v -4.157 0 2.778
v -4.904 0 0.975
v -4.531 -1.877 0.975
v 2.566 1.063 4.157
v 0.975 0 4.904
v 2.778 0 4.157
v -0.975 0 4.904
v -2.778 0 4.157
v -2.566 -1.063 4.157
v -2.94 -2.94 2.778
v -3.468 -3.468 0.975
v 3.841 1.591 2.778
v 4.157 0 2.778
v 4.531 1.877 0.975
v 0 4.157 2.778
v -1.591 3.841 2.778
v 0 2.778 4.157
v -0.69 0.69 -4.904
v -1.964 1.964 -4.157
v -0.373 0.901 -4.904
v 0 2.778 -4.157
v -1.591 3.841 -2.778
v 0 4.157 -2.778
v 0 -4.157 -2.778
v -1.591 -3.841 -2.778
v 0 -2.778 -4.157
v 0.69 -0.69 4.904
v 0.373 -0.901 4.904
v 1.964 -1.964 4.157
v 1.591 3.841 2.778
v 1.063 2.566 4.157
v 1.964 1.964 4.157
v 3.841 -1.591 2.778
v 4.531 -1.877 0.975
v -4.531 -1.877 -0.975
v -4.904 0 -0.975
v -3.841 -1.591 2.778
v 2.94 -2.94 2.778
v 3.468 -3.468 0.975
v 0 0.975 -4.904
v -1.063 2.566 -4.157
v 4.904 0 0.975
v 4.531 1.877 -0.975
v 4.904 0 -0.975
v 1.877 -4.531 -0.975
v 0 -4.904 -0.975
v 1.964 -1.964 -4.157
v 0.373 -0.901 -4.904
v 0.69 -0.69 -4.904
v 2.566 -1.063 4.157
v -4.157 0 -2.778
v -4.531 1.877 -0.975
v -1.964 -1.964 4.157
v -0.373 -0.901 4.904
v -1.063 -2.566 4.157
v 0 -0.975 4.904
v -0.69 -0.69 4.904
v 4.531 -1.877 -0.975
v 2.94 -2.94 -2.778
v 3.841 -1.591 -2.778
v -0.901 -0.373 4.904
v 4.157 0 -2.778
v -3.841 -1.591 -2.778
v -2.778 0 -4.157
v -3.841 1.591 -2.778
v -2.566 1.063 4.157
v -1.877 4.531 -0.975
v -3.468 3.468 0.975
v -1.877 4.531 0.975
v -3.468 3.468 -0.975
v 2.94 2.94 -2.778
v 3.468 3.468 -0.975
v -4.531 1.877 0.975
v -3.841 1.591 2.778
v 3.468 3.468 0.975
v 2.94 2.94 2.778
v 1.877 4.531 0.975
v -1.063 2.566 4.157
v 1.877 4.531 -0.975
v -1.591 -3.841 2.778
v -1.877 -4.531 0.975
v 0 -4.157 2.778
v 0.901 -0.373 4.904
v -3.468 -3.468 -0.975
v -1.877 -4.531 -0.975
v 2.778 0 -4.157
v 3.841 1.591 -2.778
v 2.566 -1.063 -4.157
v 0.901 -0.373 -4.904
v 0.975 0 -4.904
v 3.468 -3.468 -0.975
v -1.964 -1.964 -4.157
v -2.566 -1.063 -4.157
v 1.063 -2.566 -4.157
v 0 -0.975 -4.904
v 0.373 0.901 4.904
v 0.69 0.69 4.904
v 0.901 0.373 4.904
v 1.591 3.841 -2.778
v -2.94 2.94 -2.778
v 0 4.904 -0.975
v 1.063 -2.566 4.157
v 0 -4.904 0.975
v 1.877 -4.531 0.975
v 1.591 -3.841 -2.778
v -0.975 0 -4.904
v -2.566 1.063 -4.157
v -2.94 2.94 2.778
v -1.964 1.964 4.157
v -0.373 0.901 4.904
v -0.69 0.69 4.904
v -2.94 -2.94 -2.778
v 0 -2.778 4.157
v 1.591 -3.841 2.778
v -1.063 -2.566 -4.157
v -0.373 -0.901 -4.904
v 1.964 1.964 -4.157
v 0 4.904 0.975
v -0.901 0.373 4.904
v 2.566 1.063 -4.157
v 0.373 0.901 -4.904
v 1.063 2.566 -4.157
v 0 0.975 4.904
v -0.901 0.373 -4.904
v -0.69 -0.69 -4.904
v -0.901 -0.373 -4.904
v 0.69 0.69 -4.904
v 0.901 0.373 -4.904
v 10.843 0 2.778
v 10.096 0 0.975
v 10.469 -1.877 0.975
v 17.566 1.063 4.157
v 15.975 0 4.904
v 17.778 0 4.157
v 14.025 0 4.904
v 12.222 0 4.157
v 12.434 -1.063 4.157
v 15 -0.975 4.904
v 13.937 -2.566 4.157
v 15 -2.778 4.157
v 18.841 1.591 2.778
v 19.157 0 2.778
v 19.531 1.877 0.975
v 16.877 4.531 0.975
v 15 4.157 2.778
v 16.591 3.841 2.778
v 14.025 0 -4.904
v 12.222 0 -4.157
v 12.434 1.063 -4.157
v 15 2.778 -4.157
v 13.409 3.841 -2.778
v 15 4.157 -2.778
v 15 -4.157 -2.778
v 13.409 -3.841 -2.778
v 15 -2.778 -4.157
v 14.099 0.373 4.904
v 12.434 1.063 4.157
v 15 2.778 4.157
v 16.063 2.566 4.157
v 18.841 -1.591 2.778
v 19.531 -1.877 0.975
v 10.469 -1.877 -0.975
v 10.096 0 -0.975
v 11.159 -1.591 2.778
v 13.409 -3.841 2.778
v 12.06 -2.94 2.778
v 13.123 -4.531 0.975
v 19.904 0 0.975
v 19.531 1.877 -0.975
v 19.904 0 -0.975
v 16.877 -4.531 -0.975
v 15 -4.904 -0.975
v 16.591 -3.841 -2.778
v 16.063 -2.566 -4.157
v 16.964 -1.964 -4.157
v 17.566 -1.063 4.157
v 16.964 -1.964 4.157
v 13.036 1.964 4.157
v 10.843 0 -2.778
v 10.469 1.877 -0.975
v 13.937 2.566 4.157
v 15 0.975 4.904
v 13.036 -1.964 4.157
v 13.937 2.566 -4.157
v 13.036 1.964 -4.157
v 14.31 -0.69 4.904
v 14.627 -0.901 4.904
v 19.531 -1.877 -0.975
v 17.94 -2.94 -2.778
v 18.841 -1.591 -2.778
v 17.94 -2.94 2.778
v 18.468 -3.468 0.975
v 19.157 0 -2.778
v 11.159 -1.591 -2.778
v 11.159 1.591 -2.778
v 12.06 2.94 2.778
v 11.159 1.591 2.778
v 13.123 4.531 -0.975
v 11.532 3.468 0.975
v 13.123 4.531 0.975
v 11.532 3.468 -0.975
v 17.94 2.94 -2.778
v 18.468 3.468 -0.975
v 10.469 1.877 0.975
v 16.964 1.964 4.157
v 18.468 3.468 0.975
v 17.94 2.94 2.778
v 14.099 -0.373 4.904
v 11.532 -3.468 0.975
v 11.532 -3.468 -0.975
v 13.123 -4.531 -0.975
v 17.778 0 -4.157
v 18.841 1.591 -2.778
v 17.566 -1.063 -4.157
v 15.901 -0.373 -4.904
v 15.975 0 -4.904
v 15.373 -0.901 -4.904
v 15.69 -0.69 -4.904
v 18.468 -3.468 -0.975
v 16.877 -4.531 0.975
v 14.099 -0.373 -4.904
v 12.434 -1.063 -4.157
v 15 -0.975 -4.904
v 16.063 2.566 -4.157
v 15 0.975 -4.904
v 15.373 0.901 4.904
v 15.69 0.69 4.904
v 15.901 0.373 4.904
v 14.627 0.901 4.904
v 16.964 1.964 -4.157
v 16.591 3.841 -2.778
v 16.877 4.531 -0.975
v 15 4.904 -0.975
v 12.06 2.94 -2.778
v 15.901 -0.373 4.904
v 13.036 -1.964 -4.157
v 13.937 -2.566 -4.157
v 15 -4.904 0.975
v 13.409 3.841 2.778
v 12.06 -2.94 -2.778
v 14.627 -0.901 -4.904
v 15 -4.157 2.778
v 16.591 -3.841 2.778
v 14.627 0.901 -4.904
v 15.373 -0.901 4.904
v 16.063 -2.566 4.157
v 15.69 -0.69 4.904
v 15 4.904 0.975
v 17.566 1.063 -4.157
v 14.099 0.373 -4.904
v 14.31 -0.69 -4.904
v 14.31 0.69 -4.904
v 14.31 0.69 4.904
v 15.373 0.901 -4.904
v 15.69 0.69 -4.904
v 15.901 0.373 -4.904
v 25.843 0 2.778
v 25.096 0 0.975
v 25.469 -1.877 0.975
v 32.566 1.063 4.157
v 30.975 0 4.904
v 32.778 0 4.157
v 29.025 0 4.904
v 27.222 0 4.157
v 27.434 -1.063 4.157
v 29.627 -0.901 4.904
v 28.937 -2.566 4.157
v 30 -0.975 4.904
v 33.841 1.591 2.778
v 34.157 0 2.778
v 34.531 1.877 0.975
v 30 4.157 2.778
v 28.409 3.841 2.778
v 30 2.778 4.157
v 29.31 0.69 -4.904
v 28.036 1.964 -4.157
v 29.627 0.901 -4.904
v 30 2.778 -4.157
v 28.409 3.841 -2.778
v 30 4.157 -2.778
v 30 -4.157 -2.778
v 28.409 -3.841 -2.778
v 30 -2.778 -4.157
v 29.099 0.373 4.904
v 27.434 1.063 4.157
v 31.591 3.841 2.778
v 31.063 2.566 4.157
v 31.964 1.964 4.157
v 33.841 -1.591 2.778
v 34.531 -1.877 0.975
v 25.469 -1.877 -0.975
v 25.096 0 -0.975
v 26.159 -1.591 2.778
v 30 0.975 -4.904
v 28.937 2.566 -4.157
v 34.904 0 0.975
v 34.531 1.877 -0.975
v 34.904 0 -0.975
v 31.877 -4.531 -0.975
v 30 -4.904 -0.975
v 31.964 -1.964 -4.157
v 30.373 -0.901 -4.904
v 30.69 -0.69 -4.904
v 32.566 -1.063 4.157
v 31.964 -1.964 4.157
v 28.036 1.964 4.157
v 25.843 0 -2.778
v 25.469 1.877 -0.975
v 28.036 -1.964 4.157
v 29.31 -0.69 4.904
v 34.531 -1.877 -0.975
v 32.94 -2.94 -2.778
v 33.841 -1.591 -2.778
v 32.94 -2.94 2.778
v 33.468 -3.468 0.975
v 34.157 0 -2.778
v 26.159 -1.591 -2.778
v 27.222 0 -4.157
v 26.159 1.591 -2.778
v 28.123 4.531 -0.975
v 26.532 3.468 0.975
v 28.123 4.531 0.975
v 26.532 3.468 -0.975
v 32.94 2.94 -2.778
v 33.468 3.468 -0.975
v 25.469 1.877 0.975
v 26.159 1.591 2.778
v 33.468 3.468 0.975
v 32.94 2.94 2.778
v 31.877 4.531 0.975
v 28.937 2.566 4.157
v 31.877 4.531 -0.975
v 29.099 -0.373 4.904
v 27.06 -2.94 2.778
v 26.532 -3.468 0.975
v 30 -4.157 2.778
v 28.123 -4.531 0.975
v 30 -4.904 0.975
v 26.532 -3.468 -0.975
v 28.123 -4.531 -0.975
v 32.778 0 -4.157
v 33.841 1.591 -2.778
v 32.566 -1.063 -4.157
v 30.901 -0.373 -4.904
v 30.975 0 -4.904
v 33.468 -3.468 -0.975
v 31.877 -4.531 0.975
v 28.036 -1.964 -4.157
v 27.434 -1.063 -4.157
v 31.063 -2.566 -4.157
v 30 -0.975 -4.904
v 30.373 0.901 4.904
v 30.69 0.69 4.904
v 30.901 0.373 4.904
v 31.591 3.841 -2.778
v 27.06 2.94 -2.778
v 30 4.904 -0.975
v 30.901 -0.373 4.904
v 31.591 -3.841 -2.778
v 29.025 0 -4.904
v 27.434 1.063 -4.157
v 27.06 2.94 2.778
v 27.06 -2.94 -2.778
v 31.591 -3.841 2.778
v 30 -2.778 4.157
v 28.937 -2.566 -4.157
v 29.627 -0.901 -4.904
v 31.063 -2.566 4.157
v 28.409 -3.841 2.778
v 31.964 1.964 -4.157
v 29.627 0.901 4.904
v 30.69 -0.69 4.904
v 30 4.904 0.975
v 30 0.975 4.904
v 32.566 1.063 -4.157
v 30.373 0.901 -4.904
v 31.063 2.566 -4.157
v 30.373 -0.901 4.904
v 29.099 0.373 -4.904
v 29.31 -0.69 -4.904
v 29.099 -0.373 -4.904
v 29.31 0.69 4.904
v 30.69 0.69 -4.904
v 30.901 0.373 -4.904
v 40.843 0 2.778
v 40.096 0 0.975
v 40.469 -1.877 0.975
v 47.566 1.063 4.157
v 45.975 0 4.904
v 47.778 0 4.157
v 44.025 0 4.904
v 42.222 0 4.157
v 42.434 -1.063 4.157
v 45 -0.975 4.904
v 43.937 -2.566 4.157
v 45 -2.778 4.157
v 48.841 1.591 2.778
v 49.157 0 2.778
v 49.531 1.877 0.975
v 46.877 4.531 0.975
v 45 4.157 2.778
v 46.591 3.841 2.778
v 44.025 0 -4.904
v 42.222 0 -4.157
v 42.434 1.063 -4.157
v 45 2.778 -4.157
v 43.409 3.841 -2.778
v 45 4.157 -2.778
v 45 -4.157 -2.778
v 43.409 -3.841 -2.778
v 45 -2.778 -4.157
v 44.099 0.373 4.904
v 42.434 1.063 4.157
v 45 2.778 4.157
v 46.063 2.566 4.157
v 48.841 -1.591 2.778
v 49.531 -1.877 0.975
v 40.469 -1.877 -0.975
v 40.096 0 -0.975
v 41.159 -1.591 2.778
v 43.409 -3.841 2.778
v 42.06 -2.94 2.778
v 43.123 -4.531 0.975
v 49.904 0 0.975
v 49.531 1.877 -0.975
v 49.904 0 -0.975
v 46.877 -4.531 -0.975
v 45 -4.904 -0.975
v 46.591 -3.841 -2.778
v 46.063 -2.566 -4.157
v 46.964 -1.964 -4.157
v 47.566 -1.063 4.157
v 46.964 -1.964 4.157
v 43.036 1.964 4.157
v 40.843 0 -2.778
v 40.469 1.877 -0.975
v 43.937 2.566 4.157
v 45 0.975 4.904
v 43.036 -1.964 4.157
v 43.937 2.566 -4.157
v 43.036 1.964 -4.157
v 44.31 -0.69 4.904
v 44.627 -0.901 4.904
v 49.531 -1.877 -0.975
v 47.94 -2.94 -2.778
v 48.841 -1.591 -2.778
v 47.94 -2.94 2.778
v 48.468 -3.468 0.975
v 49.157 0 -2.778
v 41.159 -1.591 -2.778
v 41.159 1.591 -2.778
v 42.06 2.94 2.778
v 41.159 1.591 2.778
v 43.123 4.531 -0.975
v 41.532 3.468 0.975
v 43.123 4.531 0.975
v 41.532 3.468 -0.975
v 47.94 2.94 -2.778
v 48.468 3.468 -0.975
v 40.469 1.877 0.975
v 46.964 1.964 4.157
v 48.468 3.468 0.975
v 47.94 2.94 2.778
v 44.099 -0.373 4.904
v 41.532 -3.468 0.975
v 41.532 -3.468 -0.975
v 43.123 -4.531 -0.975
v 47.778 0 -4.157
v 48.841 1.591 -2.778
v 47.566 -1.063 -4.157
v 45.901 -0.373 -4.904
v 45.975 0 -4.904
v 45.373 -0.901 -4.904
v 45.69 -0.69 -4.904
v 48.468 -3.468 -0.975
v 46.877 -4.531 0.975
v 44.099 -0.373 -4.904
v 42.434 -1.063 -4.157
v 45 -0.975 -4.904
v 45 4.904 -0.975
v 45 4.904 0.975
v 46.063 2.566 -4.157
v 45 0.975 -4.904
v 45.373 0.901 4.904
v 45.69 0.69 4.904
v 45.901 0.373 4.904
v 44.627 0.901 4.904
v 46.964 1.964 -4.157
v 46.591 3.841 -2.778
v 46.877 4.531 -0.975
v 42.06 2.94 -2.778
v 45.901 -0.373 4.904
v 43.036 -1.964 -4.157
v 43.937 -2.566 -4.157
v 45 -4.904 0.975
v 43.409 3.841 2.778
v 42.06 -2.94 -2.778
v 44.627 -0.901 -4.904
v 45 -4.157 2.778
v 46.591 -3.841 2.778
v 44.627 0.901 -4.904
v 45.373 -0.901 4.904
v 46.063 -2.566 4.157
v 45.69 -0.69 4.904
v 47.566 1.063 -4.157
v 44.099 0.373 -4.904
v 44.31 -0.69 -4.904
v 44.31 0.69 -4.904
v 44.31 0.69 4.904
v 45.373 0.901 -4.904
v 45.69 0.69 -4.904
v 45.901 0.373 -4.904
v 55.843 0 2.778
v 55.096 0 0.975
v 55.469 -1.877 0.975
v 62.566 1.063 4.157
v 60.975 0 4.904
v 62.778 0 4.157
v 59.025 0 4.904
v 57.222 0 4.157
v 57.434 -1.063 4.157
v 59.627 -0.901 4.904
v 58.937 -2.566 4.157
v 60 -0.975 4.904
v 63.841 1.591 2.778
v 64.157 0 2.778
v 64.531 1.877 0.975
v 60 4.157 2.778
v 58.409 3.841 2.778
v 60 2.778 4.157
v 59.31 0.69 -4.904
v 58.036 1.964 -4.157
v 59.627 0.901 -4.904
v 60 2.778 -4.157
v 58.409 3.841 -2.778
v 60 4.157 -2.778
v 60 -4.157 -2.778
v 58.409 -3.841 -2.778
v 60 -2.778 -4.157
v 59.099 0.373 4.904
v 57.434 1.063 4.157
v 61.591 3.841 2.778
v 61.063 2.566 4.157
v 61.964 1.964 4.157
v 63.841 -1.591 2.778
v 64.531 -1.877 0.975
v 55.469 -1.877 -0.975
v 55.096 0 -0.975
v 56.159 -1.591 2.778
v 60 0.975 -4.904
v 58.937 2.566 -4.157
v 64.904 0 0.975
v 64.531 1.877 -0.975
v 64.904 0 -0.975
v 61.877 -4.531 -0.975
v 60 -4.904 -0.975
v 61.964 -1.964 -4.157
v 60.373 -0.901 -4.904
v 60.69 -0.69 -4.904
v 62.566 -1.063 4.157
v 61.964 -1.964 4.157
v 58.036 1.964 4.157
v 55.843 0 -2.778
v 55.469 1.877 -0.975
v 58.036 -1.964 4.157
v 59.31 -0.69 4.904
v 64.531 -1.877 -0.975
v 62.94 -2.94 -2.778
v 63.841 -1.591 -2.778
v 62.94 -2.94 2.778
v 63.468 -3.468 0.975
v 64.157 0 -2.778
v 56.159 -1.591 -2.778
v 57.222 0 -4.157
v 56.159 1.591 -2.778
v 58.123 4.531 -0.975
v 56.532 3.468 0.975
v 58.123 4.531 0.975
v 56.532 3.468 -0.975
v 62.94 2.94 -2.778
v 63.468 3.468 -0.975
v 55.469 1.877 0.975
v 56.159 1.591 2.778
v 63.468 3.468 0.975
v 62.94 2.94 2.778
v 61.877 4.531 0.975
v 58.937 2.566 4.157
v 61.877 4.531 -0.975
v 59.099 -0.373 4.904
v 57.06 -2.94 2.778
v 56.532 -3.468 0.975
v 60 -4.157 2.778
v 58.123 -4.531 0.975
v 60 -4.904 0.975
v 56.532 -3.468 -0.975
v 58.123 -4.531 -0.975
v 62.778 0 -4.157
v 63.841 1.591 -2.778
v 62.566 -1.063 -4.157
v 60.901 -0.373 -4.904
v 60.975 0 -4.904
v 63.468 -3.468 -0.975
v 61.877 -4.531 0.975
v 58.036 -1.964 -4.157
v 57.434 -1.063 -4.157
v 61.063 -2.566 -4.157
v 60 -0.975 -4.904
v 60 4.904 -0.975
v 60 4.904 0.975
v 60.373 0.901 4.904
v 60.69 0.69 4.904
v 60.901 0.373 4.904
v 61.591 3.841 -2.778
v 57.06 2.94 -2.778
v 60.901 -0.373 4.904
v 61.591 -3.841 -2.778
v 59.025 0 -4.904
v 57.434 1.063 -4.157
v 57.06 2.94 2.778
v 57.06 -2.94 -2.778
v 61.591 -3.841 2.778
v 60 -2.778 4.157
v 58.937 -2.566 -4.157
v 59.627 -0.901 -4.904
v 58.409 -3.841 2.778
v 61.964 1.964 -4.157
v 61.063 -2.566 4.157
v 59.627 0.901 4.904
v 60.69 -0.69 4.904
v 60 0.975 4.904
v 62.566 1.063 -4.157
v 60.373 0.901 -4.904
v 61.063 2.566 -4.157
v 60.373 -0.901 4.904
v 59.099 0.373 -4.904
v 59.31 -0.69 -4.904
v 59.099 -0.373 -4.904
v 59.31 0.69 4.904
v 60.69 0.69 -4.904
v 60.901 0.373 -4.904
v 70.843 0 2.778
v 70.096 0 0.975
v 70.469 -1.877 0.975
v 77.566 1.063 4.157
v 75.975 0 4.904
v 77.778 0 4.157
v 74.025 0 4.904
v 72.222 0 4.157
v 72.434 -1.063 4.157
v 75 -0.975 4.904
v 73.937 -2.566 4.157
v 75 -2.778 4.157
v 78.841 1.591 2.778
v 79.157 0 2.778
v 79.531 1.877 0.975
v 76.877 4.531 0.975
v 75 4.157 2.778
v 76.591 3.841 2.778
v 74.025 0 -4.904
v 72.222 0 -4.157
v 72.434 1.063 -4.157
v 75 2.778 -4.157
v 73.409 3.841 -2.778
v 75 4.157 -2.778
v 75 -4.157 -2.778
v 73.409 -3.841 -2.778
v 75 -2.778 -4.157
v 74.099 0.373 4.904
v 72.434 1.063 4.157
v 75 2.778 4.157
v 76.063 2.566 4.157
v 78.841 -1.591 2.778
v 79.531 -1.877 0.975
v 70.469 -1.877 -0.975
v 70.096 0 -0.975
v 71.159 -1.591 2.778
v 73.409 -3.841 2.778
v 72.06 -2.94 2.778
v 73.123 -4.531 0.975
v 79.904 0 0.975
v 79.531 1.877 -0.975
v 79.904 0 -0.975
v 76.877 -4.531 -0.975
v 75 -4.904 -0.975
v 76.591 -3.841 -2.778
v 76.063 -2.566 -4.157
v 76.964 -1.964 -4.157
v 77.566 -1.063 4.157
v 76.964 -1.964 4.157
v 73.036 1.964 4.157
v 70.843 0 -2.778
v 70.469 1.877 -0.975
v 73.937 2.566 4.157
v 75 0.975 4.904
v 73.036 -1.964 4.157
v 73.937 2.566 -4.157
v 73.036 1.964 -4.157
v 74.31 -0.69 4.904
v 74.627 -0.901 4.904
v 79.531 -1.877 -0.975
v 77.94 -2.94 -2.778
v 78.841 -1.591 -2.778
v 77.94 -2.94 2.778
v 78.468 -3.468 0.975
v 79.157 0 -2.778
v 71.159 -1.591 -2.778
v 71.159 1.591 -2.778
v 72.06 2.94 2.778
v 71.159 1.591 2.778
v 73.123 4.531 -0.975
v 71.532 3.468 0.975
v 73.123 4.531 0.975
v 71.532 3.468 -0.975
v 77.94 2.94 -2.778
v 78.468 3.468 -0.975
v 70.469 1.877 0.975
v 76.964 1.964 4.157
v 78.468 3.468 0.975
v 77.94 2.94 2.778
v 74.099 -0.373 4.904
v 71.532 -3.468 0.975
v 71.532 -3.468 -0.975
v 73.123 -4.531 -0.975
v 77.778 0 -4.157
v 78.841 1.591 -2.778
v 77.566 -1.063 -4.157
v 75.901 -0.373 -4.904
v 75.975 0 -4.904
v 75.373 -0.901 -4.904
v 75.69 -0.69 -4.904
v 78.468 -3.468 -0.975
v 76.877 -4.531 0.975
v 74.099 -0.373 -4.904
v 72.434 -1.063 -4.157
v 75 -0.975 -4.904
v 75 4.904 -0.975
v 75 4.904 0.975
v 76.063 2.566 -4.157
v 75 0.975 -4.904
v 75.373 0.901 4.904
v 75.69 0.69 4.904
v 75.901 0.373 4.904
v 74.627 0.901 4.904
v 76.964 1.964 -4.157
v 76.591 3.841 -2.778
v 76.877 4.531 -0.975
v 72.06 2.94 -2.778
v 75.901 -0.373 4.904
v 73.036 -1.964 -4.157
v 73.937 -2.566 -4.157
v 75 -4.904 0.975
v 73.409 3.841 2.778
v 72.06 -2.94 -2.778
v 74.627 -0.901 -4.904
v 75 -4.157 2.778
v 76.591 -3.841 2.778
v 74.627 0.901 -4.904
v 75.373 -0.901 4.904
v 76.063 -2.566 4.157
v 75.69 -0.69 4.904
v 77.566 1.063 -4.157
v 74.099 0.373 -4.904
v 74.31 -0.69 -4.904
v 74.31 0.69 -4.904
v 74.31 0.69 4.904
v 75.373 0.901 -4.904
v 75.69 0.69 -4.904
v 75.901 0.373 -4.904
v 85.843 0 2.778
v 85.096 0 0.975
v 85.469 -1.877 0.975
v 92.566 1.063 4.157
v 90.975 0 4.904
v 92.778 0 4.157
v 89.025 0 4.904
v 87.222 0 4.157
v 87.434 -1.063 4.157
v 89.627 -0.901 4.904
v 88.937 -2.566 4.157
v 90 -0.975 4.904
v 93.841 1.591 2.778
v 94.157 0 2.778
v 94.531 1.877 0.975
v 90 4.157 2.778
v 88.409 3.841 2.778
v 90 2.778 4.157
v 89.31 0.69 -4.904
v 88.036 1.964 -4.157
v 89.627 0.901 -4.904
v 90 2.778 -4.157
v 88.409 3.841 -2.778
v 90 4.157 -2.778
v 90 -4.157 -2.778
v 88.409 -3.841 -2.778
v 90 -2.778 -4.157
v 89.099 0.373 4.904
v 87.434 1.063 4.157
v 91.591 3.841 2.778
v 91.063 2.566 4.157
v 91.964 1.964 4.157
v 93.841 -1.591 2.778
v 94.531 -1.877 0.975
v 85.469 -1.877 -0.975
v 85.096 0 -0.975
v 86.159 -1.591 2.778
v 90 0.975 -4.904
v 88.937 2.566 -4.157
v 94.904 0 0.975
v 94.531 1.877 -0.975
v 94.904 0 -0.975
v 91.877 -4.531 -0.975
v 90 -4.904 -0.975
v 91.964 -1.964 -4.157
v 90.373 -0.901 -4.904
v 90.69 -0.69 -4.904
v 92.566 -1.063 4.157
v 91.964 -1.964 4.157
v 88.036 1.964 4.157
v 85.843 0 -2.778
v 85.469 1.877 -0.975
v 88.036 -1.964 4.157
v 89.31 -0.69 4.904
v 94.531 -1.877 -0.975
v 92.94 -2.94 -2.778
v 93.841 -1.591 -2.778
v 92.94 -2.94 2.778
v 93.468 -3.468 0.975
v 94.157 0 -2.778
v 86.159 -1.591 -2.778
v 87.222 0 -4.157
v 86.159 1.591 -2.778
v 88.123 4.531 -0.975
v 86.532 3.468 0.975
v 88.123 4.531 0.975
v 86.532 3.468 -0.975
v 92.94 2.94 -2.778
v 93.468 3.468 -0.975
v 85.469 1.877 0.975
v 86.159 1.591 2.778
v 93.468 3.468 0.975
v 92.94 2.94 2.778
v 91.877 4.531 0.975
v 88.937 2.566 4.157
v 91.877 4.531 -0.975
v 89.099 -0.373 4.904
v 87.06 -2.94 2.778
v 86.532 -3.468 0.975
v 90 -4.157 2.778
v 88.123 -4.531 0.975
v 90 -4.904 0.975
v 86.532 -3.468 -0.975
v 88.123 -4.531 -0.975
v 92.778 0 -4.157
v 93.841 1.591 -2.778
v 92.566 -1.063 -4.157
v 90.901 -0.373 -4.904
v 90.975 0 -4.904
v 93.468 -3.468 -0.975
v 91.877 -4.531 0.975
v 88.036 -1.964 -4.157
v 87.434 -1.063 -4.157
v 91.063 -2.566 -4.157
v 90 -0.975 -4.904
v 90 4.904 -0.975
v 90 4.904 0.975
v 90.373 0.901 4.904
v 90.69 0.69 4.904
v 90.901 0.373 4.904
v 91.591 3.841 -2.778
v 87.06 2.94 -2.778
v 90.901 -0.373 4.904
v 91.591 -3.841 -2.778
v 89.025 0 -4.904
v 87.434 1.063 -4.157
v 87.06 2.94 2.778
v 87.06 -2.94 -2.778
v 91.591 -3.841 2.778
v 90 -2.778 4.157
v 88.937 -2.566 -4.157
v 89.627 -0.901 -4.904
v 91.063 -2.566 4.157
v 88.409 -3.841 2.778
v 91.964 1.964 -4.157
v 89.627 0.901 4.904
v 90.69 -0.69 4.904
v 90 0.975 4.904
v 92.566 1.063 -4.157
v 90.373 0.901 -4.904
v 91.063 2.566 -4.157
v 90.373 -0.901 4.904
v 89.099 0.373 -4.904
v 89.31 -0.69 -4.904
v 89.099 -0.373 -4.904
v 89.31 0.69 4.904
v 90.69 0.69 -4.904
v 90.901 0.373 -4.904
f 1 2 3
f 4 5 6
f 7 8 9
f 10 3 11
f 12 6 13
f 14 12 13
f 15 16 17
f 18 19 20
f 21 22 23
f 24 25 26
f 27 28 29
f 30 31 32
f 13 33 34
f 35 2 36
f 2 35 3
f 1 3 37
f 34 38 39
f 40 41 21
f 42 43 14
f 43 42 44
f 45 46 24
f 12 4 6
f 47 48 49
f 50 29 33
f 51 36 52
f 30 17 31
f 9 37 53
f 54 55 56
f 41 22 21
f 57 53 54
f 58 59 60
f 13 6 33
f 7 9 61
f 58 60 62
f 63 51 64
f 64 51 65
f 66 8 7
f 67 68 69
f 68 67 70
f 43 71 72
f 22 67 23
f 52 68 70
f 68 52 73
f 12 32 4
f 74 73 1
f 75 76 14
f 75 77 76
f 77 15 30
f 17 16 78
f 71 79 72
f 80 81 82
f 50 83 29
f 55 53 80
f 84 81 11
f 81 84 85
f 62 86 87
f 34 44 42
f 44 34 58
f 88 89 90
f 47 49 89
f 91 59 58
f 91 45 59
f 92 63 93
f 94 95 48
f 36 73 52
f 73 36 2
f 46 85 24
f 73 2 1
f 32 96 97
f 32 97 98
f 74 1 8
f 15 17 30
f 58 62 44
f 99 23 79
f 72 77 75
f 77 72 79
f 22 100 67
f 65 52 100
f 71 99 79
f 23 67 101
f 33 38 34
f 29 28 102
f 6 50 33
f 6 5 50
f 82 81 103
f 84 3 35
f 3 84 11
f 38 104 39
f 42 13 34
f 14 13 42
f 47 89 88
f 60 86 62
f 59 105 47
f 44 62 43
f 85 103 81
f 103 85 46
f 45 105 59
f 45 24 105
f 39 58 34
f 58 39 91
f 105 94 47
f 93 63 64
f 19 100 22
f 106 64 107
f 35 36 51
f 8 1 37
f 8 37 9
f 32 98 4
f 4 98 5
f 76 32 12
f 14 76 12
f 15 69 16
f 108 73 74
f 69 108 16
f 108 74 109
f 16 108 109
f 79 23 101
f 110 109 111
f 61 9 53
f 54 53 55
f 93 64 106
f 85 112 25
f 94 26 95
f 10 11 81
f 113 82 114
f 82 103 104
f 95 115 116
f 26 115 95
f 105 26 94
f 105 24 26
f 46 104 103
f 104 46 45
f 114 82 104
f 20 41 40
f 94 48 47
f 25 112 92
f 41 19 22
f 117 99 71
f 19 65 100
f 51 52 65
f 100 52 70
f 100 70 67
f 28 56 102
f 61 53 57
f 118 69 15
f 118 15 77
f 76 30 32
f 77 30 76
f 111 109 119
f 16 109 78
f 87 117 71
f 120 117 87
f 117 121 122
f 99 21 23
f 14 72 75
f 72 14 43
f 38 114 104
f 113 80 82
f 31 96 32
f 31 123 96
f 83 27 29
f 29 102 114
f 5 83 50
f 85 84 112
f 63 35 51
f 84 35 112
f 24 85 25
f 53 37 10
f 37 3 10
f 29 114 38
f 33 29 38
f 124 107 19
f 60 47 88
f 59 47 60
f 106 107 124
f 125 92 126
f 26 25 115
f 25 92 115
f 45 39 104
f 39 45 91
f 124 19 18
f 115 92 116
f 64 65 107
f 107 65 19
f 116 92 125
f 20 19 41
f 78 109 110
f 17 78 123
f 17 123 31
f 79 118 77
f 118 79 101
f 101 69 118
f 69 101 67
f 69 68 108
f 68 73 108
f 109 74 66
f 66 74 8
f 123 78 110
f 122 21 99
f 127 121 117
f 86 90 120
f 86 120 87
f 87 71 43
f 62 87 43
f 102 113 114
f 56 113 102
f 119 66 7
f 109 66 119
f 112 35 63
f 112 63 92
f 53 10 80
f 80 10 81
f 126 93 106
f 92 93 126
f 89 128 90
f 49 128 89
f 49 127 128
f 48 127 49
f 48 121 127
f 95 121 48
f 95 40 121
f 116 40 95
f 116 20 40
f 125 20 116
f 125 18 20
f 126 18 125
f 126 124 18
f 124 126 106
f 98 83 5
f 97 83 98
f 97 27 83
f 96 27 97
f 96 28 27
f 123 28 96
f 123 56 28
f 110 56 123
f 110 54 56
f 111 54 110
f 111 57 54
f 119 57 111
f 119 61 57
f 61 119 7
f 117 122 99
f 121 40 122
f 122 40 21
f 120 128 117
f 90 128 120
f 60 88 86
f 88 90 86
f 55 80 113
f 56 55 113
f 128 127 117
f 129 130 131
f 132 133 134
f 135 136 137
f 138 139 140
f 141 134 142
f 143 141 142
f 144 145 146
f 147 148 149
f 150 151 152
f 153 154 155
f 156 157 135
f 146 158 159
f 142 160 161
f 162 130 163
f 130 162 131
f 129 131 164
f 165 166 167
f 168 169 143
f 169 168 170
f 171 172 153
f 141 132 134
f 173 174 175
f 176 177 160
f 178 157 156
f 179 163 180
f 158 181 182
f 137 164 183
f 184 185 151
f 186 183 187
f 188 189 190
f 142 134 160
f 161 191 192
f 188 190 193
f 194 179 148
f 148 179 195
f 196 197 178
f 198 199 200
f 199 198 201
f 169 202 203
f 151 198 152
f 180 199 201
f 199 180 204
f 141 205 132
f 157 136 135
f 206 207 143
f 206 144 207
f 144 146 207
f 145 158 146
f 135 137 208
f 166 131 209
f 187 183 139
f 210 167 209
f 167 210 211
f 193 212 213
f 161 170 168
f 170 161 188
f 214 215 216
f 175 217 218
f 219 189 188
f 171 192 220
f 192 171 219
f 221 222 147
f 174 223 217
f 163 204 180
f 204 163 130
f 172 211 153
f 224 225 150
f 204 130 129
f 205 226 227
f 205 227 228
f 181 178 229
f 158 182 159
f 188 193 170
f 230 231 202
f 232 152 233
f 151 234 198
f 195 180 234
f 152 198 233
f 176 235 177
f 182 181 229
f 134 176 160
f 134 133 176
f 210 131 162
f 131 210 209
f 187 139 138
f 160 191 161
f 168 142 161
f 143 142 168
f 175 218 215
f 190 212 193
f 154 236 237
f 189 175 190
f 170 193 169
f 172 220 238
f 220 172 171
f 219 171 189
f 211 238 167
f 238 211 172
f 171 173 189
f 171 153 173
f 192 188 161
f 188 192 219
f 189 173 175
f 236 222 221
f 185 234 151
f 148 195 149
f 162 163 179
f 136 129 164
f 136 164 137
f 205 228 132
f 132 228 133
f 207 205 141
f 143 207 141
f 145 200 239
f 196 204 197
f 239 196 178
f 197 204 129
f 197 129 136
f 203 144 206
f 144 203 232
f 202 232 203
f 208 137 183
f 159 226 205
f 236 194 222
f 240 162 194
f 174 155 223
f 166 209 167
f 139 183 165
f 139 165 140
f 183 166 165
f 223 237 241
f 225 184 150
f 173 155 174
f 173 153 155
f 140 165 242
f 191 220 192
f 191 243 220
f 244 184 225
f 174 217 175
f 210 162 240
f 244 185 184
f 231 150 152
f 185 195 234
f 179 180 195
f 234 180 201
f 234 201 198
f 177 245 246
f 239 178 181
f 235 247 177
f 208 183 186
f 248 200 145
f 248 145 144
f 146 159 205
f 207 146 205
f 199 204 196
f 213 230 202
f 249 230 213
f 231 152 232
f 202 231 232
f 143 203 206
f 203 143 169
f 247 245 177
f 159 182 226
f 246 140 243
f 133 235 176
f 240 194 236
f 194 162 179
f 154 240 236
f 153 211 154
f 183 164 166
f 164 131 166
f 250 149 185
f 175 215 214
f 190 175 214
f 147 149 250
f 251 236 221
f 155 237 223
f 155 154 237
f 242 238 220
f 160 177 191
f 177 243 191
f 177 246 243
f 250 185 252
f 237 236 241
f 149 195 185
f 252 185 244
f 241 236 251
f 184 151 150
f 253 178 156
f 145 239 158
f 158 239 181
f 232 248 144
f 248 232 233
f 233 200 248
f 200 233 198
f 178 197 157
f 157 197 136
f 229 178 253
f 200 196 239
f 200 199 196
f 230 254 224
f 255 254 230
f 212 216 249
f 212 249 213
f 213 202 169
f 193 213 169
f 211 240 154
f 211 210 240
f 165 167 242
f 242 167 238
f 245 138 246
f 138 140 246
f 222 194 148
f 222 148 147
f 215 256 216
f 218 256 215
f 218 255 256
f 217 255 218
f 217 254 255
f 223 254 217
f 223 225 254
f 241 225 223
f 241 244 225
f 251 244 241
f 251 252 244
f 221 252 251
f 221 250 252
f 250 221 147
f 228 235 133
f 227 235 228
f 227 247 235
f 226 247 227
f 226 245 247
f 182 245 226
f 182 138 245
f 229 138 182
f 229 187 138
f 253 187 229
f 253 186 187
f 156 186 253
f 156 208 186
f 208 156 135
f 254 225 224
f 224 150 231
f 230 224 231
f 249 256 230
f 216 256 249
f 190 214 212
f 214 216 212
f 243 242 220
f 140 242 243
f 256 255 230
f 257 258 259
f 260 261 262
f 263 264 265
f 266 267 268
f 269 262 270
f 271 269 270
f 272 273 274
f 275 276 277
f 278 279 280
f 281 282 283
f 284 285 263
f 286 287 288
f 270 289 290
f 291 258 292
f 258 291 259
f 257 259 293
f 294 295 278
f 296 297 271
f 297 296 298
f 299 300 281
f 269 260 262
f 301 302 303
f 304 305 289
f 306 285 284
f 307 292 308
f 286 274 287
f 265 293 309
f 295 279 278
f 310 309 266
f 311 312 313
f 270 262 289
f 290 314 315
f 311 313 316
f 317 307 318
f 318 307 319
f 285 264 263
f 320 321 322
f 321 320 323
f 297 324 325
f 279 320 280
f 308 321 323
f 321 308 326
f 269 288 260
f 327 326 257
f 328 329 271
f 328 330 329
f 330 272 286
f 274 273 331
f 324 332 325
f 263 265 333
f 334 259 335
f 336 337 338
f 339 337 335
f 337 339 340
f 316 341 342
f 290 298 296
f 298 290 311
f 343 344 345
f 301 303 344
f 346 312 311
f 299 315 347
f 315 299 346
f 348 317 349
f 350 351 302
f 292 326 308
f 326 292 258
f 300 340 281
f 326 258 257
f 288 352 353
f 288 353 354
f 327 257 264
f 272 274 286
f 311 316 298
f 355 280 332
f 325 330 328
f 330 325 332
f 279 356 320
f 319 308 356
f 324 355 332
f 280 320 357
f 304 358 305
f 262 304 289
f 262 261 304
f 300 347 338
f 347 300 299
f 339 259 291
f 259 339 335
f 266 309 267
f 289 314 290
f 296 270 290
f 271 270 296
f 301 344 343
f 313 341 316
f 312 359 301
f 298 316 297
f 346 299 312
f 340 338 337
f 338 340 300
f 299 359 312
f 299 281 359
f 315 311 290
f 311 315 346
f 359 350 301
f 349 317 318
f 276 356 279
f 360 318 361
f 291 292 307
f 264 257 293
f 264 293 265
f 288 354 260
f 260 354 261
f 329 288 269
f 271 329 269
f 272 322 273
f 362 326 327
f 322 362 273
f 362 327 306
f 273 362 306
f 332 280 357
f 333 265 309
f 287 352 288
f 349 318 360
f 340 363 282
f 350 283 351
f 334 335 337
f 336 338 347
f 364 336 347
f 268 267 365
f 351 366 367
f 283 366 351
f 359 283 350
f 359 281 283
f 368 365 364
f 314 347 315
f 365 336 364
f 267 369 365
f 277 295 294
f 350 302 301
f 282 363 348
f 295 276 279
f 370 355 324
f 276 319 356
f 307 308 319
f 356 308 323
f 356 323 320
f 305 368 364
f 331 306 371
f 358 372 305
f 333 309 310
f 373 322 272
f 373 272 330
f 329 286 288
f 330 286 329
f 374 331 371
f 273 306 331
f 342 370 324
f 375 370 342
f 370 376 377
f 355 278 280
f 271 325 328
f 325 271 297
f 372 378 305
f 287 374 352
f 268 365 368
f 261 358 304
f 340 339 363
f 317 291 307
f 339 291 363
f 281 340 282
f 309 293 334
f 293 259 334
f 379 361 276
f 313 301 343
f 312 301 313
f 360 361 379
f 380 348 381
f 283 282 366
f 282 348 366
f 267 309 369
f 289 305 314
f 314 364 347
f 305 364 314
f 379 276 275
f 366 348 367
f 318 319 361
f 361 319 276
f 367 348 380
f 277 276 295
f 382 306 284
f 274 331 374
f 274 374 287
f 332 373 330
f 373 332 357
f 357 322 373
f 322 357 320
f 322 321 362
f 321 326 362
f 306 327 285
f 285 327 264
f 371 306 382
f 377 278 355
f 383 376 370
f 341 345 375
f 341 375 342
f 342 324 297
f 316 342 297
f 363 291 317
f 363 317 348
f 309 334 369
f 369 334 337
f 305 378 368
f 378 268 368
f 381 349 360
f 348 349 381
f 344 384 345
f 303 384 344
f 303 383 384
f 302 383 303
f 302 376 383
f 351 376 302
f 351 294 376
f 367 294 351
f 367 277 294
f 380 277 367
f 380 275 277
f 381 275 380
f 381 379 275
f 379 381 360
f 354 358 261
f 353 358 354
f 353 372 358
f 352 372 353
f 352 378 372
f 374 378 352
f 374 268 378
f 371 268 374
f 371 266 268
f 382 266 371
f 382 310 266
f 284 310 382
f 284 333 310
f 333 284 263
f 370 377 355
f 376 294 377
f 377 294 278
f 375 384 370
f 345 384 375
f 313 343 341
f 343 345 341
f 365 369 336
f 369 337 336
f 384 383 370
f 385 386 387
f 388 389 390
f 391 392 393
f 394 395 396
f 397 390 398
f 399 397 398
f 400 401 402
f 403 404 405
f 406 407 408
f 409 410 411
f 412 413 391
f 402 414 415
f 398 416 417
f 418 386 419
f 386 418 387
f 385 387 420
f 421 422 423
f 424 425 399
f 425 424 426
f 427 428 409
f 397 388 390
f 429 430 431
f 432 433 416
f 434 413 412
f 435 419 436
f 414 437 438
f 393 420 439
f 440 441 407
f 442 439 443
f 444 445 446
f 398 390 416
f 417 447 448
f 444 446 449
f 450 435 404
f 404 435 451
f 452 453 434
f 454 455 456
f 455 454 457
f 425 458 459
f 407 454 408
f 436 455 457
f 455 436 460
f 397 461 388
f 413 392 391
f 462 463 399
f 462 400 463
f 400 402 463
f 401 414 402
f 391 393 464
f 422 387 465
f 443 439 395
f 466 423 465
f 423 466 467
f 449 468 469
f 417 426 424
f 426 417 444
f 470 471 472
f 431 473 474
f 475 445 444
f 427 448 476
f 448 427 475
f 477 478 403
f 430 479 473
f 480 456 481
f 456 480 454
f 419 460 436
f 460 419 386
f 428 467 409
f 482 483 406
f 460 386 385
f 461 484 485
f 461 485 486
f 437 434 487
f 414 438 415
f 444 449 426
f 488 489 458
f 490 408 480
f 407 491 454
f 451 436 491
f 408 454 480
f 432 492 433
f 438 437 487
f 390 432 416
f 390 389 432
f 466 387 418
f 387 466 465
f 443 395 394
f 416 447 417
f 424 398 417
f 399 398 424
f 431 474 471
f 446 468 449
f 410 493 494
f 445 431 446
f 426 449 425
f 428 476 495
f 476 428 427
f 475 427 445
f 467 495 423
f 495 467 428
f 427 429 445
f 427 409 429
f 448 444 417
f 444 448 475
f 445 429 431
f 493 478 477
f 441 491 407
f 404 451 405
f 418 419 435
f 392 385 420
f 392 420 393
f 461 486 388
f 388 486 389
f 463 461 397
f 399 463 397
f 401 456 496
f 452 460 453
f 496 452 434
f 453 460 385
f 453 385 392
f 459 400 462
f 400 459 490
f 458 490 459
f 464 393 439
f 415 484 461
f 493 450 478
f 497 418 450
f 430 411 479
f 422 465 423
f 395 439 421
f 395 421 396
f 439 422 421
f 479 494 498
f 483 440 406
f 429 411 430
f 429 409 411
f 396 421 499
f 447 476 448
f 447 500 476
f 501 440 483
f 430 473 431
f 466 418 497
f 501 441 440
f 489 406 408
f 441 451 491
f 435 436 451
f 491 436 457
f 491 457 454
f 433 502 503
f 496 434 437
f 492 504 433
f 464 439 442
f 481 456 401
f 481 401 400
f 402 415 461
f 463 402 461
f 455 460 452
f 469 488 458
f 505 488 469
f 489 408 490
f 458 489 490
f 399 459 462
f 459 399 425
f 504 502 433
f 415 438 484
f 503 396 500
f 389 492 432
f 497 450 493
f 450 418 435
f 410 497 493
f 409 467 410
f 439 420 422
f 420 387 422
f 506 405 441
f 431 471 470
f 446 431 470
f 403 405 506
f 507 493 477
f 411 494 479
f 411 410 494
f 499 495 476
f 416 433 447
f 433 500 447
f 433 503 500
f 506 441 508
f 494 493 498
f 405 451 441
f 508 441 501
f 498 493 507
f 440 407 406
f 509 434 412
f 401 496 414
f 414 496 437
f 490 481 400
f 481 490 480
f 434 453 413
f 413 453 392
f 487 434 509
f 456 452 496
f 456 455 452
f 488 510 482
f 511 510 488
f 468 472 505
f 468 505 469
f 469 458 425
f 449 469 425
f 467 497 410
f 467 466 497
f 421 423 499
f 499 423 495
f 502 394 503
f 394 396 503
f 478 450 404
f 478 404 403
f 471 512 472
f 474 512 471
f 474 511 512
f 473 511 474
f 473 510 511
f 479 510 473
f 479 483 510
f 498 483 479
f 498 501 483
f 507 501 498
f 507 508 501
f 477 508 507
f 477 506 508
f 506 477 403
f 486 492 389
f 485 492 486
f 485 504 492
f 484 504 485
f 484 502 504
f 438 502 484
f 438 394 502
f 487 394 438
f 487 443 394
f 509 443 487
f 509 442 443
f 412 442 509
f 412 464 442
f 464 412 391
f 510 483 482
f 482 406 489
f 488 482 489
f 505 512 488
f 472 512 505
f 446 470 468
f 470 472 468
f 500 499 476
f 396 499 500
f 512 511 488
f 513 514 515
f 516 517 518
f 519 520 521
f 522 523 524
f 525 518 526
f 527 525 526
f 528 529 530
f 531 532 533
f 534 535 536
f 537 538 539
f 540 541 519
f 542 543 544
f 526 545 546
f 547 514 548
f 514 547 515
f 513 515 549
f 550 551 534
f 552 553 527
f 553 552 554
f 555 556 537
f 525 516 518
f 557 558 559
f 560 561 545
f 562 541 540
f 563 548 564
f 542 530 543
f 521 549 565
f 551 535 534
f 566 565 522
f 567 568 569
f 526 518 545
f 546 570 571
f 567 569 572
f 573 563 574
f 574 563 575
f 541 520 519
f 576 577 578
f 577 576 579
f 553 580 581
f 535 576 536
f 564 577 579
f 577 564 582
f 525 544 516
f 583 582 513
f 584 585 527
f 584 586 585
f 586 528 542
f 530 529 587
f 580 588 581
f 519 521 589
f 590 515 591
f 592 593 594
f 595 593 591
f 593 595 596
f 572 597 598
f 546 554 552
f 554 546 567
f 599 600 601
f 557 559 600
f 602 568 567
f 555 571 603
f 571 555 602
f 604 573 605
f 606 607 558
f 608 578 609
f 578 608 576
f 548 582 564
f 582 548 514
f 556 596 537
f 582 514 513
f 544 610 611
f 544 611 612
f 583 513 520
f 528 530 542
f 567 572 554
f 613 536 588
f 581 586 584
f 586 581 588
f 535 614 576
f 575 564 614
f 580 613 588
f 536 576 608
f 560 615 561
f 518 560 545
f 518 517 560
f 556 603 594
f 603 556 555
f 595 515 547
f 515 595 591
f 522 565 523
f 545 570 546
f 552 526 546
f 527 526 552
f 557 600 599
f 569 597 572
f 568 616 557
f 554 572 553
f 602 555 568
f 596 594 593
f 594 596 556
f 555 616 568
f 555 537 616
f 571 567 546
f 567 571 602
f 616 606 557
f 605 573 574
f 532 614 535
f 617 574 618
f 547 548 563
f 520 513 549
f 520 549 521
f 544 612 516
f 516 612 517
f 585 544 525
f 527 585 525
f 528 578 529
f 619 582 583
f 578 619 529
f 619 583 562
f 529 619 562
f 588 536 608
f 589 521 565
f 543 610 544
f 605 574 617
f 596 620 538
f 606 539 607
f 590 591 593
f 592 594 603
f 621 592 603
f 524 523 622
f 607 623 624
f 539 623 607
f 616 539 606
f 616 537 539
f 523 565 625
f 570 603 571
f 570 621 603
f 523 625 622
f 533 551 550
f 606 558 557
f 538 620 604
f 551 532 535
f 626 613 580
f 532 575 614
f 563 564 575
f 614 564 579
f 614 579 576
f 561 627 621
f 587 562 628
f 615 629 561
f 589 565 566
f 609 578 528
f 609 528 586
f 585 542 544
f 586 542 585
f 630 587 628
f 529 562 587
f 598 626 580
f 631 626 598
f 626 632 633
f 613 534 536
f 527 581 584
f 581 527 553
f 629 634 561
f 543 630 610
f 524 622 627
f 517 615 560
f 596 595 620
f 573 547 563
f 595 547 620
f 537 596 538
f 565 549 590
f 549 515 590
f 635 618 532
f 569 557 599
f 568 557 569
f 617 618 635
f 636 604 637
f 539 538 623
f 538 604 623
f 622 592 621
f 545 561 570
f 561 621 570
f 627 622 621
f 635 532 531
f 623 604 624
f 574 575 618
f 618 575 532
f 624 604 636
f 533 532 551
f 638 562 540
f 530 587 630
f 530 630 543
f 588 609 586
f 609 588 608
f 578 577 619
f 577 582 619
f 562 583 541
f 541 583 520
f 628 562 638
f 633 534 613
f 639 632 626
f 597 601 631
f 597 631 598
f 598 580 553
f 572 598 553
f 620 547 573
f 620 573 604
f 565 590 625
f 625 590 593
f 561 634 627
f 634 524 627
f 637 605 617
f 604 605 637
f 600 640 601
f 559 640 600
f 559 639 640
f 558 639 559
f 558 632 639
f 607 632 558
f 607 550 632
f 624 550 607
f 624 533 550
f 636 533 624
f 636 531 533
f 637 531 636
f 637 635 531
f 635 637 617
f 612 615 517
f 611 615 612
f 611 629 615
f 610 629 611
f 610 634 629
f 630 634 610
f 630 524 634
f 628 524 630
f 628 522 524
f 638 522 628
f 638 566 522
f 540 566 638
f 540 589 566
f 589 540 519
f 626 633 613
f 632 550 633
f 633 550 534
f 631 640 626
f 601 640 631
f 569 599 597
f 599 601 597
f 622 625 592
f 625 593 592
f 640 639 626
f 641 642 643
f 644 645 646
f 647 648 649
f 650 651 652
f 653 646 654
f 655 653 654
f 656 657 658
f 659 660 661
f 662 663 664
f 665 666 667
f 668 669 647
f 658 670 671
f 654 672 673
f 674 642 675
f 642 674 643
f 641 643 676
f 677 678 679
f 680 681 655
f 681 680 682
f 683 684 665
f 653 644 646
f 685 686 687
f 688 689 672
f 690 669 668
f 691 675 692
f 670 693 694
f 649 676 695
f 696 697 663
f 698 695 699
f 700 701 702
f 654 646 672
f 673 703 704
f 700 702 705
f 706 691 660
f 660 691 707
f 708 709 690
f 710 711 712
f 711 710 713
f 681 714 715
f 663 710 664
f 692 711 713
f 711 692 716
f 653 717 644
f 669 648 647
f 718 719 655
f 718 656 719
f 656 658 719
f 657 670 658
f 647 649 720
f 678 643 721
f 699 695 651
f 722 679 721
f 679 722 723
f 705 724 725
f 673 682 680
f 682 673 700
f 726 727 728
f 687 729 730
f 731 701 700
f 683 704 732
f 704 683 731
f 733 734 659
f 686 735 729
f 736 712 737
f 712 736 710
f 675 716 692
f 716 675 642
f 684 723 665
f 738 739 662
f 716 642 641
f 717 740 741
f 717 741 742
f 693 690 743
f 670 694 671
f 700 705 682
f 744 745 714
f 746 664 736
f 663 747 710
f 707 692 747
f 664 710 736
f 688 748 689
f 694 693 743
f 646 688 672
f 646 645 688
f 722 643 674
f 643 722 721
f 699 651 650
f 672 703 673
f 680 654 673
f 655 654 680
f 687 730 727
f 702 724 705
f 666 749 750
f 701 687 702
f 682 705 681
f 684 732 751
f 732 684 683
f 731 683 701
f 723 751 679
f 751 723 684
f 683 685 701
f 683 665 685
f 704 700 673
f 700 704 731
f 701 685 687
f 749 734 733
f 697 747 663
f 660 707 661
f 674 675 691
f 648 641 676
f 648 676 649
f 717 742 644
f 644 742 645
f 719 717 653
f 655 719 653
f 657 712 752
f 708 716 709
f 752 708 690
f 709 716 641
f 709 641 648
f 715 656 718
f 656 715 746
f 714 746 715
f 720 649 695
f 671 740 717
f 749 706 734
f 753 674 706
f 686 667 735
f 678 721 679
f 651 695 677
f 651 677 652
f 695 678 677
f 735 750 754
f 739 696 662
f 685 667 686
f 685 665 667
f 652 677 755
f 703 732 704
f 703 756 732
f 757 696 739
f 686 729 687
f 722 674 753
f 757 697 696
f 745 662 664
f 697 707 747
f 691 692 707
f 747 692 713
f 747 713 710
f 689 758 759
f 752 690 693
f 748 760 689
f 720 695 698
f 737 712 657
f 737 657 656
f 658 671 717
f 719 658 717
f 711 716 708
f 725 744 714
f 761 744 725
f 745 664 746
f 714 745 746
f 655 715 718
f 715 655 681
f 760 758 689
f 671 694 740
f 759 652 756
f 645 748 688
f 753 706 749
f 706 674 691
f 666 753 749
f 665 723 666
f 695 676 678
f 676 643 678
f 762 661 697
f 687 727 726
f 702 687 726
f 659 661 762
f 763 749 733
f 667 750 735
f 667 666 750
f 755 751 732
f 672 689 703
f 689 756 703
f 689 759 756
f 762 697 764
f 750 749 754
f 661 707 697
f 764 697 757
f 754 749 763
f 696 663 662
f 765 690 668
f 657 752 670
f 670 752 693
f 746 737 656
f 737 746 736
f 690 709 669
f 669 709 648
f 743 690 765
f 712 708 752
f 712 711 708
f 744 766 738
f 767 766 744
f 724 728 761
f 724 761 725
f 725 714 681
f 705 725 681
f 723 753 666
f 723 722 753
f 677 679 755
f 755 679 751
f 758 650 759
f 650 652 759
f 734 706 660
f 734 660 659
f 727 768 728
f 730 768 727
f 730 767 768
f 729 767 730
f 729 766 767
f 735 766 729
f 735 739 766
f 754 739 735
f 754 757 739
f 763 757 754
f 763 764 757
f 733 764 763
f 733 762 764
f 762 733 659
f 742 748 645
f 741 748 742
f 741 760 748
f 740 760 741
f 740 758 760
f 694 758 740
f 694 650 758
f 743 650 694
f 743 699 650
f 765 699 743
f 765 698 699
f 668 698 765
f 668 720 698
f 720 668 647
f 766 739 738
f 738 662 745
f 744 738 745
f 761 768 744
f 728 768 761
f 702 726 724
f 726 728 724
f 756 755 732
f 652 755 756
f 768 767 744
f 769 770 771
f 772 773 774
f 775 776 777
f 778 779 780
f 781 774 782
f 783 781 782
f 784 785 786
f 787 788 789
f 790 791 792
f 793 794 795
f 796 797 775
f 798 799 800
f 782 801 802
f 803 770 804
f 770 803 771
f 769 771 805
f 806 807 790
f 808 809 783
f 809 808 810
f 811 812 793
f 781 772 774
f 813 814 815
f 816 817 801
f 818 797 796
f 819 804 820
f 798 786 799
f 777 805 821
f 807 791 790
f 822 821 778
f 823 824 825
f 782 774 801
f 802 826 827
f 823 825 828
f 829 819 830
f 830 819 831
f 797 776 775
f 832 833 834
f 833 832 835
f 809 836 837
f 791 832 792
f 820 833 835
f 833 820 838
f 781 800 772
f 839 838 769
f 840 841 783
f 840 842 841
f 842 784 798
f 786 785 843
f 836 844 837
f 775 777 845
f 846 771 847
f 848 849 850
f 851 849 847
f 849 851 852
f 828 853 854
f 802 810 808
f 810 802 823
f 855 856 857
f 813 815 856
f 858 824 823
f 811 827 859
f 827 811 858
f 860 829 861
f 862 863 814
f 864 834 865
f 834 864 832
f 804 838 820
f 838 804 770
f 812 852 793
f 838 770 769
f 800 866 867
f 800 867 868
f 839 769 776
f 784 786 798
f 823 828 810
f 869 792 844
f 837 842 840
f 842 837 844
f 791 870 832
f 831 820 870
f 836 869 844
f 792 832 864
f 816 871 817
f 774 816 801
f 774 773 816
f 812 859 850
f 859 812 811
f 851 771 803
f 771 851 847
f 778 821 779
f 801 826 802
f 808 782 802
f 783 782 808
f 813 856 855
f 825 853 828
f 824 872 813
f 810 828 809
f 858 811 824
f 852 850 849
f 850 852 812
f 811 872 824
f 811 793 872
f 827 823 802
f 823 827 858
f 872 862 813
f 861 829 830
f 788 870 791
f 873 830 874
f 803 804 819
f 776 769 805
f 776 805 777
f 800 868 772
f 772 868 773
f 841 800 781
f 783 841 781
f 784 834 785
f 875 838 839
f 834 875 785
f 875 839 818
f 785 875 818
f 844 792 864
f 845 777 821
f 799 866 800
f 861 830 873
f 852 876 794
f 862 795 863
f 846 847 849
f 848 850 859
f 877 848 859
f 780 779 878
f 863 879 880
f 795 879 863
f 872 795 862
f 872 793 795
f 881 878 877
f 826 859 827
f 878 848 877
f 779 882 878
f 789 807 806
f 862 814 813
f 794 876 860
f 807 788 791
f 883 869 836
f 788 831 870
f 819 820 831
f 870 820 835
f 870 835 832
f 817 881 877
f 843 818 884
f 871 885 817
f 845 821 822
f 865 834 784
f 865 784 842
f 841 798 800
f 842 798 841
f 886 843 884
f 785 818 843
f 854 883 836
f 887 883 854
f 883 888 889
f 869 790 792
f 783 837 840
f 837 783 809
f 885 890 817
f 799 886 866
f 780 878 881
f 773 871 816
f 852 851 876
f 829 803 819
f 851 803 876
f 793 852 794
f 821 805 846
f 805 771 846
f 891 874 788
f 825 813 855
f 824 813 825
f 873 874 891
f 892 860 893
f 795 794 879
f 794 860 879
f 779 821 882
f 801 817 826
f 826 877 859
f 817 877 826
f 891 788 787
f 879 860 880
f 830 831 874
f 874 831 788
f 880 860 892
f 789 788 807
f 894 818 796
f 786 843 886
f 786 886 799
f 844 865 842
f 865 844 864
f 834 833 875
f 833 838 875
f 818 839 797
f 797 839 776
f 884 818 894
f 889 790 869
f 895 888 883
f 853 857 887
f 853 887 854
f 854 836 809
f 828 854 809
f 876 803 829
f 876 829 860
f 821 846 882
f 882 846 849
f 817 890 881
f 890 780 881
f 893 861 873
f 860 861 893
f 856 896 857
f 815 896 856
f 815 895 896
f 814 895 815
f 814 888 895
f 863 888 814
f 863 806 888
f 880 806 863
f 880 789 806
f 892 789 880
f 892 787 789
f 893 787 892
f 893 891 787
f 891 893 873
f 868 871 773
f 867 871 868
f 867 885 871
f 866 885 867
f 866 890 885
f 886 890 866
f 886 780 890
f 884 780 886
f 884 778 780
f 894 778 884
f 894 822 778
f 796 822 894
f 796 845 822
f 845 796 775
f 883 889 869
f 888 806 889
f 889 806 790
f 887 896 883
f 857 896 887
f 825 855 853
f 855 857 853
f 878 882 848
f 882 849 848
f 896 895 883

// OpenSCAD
for ( a=[0:15:100] ){
    translate([a,0,0]){
        sphere(r=5,h=10);
    }
}  //aは0から15間隔で100まで
